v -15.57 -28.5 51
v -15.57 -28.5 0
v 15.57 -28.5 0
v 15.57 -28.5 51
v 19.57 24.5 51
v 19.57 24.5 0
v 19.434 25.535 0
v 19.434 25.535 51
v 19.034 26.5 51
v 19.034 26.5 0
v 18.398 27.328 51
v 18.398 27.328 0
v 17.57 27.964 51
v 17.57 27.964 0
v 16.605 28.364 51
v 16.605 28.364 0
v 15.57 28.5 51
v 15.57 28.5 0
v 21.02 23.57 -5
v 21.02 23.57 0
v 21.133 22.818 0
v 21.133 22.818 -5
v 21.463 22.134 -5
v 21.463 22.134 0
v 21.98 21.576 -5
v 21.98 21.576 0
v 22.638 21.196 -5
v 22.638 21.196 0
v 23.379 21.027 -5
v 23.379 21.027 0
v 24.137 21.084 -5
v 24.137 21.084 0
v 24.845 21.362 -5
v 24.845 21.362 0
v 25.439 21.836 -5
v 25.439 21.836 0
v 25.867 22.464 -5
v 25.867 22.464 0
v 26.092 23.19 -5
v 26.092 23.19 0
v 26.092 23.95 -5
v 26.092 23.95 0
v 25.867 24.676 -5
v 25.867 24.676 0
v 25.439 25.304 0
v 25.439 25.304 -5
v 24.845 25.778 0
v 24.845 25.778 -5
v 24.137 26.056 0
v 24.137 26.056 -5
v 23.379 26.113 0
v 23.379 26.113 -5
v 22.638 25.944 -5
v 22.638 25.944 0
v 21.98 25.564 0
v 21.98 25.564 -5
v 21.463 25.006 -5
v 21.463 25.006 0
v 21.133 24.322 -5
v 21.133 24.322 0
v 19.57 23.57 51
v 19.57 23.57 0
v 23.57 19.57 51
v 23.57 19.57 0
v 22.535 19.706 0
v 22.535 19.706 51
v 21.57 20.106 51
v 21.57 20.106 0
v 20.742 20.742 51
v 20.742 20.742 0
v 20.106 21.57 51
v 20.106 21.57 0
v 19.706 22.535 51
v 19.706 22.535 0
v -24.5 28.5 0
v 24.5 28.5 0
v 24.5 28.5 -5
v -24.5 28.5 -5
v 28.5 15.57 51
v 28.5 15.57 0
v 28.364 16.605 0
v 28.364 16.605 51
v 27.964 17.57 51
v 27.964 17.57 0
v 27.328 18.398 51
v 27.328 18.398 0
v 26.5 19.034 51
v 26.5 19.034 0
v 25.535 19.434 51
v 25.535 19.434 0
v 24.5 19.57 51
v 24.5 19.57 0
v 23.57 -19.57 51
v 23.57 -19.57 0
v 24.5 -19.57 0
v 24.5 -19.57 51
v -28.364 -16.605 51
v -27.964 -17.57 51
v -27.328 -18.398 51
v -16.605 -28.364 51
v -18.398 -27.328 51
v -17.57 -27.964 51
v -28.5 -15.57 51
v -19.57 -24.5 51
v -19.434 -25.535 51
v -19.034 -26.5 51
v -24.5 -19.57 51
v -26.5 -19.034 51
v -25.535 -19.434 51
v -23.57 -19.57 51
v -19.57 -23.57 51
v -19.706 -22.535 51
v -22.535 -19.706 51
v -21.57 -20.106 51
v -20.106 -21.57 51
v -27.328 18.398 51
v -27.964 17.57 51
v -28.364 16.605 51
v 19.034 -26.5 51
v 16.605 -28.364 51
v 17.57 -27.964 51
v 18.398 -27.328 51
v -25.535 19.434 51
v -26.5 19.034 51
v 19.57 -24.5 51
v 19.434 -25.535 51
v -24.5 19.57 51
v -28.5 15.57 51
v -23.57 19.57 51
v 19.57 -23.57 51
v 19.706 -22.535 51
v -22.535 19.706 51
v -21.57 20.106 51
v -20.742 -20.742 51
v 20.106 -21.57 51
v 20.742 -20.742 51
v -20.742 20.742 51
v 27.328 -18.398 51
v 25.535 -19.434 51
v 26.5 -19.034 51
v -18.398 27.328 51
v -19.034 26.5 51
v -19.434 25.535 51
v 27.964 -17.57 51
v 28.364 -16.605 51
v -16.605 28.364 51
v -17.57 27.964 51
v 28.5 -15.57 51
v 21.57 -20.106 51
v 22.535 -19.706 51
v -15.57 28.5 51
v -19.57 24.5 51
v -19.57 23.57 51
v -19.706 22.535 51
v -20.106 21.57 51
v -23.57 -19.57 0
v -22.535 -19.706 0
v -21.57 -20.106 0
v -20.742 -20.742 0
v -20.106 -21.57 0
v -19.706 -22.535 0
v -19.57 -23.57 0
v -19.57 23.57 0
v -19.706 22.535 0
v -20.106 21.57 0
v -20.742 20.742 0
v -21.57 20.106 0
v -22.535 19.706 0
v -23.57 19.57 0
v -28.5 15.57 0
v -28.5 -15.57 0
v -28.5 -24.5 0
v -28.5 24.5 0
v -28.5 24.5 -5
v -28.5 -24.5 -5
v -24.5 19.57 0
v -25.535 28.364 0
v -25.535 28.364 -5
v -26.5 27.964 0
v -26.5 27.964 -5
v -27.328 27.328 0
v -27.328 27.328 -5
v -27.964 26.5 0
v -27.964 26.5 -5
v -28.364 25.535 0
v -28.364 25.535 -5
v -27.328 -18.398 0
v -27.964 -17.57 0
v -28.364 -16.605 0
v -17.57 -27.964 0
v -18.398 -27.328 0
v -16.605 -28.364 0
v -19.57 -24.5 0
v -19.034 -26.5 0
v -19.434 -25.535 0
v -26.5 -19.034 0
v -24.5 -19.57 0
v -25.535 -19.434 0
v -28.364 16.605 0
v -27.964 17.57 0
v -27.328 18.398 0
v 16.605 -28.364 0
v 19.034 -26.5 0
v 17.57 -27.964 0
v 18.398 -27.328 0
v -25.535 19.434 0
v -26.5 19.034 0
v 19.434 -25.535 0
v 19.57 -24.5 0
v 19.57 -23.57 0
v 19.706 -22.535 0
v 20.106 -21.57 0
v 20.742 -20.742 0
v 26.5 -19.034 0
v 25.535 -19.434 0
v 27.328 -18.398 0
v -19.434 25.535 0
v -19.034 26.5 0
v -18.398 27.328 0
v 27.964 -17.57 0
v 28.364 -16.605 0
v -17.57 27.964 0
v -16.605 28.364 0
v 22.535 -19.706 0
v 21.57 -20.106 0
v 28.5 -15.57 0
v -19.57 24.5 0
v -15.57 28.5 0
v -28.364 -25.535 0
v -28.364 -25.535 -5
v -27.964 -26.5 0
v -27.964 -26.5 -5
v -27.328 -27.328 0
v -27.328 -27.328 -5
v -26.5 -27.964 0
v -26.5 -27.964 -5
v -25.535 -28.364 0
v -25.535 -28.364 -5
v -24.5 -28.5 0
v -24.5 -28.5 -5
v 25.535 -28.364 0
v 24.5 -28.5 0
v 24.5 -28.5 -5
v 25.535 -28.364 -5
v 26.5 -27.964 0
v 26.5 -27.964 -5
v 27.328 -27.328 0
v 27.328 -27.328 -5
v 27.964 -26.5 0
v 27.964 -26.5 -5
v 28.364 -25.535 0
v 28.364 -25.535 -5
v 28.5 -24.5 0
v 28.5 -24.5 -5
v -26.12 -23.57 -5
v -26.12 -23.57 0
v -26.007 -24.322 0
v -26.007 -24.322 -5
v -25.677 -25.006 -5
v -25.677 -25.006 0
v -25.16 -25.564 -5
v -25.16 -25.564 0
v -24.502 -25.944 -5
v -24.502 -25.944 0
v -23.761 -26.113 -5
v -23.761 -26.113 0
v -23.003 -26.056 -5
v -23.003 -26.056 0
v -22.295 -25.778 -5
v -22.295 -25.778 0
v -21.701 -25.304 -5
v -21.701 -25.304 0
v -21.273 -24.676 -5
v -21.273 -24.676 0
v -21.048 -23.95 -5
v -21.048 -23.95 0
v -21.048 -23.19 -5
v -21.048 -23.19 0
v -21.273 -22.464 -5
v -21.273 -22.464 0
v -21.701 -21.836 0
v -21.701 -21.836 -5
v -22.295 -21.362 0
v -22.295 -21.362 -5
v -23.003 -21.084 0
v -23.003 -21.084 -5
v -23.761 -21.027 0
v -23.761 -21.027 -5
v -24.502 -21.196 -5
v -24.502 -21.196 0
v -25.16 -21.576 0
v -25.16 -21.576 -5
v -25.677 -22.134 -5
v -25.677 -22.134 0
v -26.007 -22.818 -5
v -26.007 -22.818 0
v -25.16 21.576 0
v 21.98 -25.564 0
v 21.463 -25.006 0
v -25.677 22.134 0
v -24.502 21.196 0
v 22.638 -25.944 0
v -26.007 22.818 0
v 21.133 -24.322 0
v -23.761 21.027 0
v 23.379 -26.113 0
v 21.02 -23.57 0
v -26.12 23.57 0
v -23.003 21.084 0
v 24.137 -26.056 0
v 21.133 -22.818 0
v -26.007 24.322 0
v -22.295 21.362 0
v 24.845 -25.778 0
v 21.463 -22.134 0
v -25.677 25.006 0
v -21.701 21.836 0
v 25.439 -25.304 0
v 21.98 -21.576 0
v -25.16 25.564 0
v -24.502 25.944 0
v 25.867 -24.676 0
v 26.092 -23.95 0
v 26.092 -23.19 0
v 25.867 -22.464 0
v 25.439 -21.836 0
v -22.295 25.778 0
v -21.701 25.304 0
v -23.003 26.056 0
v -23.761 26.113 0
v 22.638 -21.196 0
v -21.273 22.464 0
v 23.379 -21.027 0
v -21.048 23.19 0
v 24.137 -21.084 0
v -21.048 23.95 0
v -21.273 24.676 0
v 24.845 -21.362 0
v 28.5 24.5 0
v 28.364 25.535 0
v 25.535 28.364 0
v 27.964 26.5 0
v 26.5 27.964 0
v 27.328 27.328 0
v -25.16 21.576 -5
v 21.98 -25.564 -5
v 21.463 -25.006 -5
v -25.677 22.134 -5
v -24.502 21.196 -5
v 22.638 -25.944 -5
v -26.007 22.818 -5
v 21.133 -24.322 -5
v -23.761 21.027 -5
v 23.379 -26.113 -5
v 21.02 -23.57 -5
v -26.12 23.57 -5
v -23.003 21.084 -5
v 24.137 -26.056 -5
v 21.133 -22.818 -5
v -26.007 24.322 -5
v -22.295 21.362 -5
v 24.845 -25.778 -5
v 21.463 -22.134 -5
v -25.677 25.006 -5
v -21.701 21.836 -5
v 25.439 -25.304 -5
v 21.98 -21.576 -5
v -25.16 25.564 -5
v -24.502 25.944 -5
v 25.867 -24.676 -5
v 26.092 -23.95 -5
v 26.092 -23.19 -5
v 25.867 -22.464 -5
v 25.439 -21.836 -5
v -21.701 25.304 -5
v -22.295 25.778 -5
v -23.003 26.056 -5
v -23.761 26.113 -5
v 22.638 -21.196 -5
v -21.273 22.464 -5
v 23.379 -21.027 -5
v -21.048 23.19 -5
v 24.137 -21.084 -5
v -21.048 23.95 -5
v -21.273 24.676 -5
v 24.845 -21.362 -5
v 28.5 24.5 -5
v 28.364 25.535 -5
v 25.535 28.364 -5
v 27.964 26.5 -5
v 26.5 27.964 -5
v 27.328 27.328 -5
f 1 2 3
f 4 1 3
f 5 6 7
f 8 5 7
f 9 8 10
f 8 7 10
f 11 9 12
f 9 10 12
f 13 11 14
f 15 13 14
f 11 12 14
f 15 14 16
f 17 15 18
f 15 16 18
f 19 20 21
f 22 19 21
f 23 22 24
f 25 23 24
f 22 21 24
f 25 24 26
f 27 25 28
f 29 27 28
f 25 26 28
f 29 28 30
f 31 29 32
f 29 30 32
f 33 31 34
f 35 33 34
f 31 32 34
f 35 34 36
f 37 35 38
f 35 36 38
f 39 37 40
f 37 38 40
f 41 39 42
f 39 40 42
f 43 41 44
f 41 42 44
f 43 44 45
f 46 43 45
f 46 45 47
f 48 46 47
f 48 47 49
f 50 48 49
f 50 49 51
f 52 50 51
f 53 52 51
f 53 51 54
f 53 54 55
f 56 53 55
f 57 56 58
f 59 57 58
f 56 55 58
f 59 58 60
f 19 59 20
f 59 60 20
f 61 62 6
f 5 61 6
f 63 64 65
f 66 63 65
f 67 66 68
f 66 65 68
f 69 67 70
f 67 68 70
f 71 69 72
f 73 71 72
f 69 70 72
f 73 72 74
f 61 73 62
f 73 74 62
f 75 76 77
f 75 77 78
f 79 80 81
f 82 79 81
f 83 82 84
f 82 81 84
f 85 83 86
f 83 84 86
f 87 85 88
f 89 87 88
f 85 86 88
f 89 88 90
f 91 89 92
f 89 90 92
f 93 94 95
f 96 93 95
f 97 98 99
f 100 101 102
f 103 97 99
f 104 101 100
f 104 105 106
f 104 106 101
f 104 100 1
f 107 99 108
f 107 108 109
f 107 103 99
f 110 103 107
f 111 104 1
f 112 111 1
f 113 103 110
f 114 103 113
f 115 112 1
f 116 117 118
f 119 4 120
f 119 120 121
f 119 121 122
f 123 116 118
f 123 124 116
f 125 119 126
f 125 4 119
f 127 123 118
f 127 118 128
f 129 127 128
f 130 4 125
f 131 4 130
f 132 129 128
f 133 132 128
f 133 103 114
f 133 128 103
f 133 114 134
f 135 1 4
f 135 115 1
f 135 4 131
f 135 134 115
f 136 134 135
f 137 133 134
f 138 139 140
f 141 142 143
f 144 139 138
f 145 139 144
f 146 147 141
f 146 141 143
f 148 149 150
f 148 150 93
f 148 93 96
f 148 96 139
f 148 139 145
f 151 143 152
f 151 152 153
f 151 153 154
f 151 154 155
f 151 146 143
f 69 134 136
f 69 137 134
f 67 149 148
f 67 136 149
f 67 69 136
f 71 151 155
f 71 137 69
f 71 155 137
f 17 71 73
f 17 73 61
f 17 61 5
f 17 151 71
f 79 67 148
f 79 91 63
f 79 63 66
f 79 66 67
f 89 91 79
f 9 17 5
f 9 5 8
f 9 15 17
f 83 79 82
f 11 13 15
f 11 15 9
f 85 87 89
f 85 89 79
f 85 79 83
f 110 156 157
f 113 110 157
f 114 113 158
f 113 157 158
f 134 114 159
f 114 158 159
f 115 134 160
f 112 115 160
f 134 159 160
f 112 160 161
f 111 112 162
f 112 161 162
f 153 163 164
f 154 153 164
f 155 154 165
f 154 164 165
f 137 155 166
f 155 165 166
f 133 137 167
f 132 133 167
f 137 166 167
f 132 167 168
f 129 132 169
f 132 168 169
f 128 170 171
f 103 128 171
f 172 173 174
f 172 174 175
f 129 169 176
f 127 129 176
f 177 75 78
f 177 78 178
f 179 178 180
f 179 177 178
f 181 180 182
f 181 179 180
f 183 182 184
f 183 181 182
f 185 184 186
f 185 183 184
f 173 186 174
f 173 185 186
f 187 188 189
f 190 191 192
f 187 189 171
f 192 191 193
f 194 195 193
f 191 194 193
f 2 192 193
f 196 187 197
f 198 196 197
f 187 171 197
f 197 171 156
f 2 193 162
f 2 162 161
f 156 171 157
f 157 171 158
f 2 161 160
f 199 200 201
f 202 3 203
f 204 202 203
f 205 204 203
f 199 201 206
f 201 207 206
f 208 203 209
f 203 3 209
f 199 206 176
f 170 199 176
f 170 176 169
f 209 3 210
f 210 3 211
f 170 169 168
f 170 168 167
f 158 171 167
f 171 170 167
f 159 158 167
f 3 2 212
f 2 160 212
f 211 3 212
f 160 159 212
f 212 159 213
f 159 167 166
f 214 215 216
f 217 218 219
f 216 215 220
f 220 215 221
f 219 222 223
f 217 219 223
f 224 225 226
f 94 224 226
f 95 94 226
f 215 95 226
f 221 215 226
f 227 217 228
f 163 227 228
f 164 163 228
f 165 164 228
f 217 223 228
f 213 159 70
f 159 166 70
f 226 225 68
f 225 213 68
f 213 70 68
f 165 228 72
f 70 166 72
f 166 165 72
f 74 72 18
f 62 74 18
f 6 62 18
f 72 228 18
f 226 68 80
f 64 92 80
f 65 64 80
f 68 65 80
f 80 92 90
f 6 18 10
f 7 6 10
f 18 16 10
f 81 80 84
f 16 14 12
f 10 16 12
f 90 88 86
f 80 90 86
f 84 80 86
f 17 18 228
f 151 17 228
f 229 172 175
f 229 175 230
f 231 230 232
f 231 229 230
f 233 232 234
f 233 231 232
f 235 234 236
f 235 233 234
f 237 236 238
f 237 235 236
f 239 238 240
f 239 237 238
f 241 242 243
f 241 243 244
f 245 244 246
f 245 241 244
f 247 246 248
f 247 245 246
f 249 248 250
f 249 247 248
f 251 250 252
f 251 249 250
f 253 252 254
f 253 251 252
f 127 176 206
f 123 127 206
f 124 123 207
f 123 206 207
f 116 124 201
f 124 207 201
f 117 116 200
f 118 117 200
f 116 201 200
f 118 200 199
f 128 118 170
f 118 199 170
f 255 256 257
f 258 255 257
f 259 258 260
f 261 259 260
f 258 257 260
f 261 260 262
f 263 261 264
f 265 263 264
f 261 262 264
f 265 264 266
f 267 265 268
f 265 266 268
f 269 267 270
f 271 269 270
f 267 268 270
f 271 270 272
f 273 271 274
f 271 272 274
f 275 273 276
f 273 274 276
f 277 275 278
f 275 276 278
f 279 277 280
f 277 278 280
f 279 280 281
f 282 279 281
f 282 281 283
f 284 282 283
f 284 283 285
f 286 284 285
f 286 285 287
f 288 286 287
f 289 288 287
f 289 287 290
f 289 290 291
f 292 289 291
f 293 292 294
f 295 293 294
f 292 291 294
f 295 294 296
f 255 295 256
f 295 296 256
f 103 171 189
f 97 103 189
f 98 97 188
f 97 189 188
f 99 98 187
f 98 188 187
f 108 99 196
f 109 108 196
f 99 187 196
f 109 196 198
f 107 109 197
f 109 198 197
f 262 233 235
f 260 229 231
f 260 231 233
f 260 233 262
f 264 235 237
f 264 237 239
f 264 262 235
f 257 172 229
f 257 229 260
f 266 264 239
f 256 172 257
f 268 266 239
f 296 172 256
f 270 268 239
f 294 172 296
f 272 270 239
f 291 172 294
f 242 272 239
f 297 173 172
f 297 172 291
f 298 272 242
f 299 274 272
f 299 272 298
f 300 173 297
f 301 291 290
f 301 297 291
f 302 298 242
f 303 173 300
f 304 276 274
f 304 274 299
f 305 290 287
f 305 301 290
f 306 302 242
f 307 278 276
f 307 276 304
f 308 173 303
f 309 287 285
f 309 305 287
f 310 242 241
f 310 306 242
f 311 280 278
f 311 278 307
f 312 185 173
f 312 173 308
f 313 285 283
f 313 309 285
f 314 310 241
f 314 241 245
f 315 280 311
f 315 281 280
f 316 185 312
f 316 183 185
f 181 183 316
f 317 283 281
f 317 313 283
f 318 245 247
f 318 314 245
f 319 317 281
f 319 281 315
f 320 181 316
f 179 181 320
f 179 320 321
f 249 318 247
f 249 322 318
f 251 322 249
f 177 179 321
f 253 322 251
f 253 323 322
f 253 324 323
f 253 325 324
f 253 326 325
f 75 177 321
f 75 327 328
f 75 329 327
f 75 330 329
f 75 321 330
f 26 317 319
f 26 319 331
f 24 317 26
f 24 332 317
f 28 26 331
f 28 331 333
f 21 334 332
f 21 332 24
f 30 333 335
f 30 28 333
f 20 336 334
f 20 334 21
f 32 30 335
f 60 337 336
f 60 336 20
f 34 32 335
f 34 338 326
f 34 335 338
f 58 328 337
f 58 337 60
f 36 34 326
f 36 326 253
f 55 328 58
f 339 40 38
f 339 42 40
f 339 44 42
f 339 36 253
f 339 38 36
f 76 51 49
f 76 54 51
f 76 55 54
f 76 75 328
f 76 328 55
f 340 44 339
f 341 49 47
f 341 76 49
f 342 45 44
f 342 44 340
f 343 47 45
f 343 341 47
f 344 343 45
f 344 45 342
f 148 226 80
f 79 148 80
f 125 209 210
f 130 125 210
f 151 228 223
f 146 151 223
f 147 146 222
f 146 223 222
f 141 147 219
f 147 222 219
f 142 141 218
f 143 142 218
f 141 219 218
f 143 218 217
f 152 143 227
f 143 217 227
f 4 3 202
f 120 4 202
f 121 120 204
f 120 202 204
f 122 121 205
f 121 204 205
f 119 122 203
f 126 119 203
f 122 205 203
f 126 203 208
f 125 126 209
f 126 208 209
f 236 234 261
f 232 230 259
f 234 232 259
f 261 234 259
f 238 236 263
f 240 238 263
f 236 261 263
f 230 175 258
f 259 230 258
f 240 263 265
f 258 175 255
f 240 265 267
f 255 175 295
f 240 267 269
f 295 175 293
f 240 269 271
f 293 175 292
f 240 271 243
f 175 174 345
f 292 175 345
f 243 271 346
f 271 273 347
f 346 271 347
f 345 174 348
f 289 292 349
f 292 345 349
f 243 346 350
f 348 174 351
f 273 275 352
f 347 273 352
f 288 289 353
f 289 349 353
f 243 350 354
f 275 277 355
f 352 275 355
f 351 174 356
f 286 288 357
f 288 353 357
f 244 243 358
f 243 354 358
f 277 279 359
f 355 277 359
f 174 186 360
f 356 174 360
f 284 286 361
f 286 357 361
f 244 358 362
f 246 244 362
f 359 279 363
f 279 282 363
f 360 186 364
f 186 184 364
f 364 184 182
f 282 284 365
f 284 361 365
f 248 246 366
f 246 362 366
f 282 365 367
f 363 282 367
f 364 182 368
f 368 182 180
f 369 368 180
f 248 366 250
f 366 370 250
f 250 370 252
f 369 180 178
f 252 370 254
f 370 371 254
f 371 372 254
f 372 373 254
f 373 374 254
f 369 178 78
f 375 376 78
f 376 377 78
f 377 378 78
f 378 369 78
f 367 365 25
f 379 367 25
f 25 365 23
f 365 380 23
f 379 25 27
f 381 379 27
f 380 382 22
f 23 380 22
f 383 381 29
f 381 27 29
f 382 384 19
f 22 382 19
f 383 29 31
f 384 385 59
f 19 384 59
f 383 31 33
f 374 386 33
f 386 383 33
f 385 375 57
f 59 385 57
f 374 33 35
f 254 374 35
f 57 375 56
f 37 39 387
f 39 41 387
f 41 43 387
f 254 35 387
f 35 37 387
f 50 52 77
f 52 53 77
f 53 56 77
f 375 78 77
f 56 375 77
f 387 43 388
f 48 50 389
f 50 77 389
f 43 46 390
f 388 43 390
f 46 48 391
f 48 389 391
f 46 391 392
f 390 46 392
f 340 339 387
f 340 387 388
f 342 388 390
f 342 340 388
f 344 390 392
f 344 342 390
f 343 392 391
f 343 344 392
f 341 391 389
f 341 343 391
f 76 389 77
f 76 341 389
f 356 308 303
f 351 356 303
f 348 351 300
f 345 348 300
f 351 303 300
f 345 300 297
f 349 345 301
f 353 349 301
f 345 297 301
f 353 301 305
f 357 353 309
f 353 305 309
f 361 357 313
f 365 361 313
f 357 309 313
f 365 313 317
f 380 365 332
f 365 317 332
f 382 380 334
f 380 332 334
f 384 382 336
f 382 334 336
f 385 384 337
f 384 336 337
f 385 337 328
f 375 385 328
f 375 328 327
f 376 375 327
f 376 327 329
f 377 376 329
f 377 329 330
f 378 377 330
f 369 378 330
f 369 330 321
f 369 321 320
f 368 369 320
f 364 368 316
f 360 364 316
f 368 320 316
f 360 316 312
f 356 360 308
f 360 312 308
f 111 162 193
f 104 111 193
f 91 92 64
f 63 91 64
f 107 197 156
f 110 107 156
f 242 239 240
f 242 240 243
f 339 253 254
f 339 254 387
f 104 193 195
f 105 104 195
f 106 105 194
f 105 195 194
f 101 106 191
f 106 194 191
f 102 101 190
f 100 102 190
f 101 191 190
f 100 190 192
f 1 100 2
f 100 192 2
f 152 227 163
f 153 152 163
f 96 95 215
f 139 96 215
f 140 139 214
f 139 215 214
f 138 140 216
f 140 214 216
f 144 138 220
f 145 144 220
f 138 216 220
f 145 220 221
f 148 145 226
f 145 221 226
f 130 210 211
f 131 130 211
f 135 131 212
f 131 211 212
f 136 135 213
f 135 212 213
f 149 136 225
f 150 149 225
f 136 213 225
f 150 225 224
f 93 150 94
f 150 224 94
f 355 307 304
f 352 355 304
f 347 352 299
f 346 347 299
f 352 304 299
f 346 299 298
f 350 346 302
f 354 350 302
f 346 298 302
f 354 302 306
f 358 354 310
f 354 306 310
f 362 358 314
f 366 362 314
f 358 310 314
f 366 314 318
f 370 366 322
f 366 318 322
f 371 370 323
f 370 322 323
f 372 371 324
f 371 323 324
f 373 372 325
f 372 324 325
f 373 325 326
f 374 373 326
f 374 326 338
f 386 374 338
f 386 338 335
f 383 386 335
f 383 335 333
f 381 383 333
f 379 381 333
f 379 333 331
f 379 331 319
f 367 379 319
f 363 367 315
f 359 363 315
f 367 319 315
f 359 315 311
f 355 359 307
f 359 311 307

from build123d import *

# Parameters (mm, degrees)
BOSS_EXTRUDE1_DEPTH = 5
BOSS_EXTRUDE2_DEPTH = 51


with BuildPart() as part:
    # Sketch2 → Boss-Extrude1 (new body)
    with BuildSketch(Plane.XY):
        with BuildLine():
            Line((24.5, 28.5), (-24.5, 28.5))
            ThreePointArc((-24.5, 28.5), (-27.328427125, 27.328427125), (-28.5, 24.5))
            Line((-28.5, 24.5), (-28.5, 16.956333897))
            Line((-28.5, 16.956333897), (-28.5, 14.868769462))
            Line((-28.5, 14.868769462), (-28.5, 12.443898331))
            Line((-28.5, 12.443898331), (-28.5, 10.356333897))
            Line((-28.5, 10.356333897), (-28.5, -10.356333897))
            Line((-28.5, -10.356333897), (-28.5, -12.443898331))
            Line((-28.5, -12.443898331), (-28.5, -14.868769462))
            Line((-28.5, -14.868769462), (-28.5, -16.956333897))
            Line((-28.5, -16.956333897), (-28.5, -24.5))
            ThreePointArc((-28.5, -24.5), (-27.328427125, -27.328427125), (-24.5, -28.5))
            Line((-24.5, -28.5), (24.5, -28.5))
            ThreePointArc((24.5, -28.5), (27.328427125, -27.328427125), (28.5, -24.5))
            Line((28.5, -24.5), (28.5, -16.956333897))
            Line((28.5, -16.956333897), (28.5, -14.868769462))
            Line((28.5, -14.868769462), (28.5, -12.443898331))
            Line((28.5, -12.443898331), (28.5, -10.356333897))
            Line((28.5, -10.356333897), (28.5, 10.356333897))
            Line((28.5, 10.356333897), (28.5, 12.443898331))
            Line((28.5, 12.443898331), (28.5, 14.868769462))
            Line((28.5, 14.868769462), (28.5, 16.956333897))
            Line((28.5, 16.956333897), (28.5, 24.5))
            ThreePointArc((28.5, 24.5), (27.328427125, 27.328427125), (24.5, 28.5))
        make_face()
        with BuildLine():
            ThreePointArc((26.12, -23.57), (23.57, -21.02), (21.02, -23.57))
            ThreePointArc((21.02, -23.57), (23.57, -26.12), (26.12, -23.57))
        make_face(mode=Mode.SUBTRACT)
        with BuildLine():
            ThreePointArc((26.12, 23.57), (23.57, 26.12), (21.02, 23.57))
            ThreePointArc((21.02, 23.57), (23.57, 21.02), (26.12, 23.57))
        make_face(mode=Mode.SUBTRACT)
        with BuildLine():
            ThreePointArc((-21.02, 23.57), (-23.57, 26.12), (-26.12, 23.57))
            ThreePointArc((-26.12, 23.57), (-23.57, 21.02), (-21.02, 23.57))
        make_face(mode=Mode.SUBTRACT)
        with BuildLine():
            ThreePointArc((-21.02, -23.57), (-23.57, -21.02), (-26.12, -23.57))
            ThreePointArc((-26.12, -23.57), (-23.57, -26.12), (-21.02, -23.57))
        make_face(mode=Mode.SUBTRACT)
    extrude(amount=-BOSS_EXTRUDE1_DEPTH)


with BuildPart() as body_2:
    # Sketch3 → Boss-Extrude2 (new body)
    with BuildSketch(Plane.XY):
        with BuildLine():
            Line((-15.57, -28.5), (15.57, -28.5))
            ThreePointArc((15.57, -28.5), (18.398427125, -27.328427125), (19.57, -24.5))
            Line((19.57, -24.5), (19.57, -23.57))
            ThreePointArc((19.57, -23.57), (20.741572875, -20.741572875), (23.57, -19.57))
            Line((23.57, -19.57), (24.5, -19.57))
            ThreePointArc((24.5, -19.57), (27.328427125, -18.398427125), (28.5, -15.57))
            Line((28.5, -15.57), (28.5, 15.57))
            ThreePointArc((28.5, 15.57), (27.328427125, 18.398427125), (24.5, 19.57))
            Line((24.5, 19.57), (23.57, 19.57))
            ThreePointArc((23.57, 19.57), (20.741572875, 20.741572875), (19.57, 23.57))
            Line((19.57, 23.57), (19.57, 24.5))
            ThreePointArc((19.57, 24.5), (18.398427125, 27.328427125), (15.57, 28.5))
            Line((15.57, 28.5), (-15.57, 28.5))
            ThreePointArc((-15.57, 28.5), (-18.398427125, 27.328427125), (-19.57, 24.5))
            Line((-19.57, 24.5), (-19.57, 23.57))
            ThreePointArc((-19.57, 23.57), (-20.741572875, 20.741572875), (-23.57, 19.57))
            Line((-23.57, 19.57), (-24.5, 19.57))
            ThreePointArc((-24.5, 19.57), (-27.328427125, 18.398427125), (-28.5, 15.57))
            Line((-28.5, 15.57), (-28.5, -15.57))
            ThreePointArc((-28.5, -15.57), (-27.328427125, -18.398427125), (-24.5, -19.57))
            Line((-24.5, -19.57), (-23.57, -19.57))
            ThreePointArc((-23.57, -19.57), (-20.741572875, -20.741572875), (-19.57, -23.57))
            Line((-19.57, -23.57), (-19.57, -24.5))
            ThreePointArc((-19.57, -24.5), (-18.398427125, -27.328427125), (-15.57, -28.5))
        make_face()
    extrude(amount=BOSS_EXTRUDE2_DEPTH)


solid = Compound([part.part, body_2.part])
